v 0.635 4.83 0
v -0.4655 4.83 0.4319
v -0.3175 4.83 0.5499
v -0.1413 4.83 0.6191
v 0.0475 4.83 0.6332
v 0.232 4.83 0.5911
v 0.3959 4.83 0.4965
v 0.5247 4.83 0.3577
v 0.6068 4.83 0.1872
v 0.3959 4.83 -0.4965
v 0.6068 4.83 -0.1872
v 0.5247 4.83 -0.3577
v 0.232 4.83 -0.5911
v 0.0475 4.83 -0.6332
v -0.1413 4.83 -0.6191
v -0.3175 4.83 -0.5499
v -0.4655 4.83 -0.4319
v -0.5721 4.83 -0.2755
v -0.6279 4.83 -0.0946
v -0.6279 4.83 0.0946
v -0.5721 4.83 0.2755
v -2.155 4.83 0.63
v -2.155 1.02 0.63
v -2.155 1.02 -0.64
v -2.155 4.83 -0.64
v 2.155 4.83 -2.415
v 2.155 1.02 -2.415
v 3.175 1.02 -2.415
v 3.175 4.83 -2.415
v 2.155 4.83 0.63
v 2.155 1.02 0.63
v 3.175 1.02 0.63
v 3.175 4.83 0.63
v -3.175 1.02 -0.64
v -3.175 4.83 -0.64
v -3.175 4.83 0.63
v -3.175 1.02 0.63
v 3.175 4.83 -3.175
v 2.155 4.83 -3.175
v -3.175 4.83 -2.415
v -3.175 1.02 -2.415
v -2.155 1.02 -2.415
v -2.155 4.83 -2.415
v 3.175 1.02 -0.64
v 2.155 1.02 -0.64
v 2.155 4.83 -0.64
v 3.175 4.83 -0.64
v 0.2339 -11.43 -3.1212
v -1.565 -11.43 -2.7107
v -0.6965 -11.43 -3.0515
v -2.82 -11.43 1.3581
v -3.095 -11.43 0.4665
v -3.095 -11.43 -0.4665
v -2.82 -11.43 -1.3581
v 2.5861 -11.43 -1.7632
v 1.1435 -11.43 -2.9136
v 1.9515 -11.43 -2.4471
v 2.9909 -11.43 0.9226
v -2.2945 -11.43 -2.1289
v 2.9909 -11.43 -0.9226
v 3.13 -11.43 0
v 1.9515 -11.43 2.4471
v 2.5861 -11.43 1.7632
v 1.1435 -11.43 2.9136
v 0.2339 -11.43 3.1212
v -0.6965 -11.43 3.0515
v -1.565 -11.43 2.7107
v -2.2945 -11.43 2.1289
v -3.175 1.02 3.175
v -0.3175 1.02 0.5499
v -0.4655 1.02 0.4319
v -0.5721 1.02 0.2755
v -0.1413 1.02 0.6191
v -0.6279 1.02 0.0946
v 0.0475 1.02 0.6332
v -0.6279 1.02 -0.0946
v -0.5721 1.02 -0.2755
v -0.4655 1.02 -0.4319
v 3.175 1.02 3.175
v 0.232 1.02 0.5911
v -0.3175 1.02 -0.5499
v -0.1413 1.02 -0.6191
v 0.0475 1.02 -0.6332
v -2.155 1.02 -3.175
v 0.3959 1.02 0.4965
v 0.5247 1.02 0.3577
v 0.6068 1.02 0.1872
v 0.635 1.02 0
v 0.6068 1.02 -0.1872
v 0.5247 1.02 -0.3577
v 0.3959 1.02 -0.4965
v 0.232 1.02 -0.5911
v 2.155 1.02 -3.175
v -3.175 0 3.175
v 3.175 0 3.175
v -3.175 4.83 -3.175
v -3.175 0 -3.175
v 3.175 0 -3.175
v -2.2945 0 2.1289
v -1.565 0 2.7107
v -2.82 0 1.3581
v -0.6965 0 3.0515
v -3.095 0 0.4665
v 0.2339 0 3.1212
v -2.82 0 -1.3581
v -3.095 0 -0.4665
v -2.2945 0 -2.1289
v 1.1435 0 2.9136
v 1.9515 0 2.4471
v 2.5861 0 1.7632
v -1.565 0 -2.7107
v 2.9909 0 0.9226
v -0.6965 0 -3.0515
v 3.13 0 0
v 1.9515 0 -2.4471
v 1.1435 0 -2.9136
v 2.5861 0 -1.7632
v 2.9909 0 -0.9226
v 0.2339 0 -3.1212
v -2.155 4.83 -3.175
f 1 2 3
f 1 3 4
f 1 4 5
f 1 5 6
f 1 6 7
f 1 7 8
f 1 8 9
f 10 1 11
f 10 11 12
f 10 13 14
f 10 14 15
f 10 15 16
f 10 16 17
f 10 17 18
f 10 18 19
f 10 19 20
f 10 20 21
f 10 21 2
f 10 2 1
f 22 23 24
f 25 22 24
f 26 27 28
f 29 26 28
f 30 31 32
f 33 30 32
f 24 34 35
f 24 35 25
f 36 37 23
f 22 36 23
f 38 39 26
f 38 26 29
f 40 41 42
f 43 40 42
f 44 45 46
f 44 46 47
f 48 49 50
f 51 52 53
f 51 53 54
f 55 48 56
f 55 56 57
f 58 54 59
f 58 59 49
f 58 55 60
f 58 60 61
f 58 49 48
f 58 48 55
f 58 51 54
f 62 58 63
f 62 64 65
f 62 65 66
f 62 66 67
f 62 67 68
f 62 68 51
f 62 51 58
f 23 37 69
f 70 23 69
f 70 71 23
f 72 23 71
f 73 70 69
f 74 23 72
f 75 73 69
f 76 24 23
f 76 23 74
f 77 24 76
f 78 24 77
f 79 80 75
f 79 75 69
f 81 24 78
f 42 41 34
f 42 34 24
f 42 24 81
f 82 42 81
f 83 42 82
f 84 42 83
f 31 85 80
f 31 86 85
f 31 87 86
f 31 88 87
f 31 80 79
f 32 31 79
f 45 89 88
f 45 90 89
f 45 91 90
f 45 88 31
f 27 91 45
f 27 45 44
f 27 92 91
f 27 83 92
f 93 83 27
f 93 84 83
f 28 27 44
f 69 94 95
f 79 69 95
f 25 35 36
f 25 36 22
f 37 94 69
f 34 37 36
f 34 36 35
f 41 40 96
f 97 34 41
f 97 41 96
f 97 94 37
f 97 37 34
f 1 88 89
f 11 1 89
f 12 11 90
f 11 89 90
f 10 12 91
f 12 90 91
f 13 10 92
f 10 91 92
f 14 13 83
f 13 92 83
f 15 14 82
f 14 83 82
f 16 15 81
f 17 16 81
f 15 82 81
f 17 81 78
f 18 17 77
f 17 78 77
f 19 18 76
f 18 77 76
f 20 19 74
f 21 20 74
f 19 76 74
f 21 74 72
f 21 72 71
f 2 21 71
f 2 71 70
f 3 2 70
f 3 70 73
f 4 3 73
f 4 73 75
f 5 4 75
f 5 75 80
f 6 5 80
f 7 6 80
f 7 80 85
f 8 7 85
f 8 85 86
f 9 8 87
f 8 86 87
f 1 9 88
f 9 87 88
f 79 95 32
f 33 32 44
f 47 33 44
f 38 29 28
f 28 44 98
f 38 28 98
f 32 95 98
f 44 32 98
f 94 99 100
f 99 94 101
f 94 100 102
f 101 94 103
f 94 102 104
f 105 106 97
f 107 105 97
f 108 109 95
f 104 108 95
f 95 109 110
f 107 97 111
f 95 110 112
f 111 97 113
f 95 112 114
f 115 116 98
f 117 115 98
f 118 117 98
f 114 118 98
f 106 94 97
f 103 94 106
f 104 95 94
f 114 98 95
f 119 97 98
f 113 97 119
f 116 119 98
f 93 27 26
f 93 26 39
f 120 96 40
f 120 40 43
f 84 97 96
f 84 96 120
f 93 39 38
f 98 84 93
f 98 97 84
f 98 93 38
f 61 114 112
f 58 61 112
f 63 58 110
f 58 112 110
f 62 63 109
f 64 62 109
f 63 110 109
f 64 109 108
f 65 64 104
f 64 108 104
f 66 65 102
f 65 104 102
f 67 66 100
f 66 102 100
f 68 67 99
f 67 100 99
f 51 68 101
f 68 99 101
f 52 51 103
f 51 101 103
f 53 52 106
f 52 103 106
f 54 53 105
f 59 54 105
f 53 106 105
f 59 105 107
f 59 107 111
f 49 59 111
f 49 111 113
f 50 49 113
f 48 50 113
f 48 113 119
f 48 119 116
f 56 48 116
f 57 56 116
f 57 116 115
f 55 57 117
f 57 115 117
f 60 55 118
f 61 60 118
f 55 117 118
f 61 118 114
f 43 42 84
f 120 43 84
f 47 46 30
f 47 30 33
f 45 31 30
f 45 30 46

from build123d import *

# Parameters (mm, degrees)
SKETCH1_W           = 6.35
SKETCH1_H           = 6.35
BOSS_EXTRUDE1_DEPTH = 1.02
SKETCH2_W           = 1.02
SKETCH2_H           = 0.76
SKETCH2_H_2         = 1.27
BOSS_EXTRUDE2_DEPTH = 3.81
SKETCH3_R           = 0.635
BOSS_EXTRUDE3_DEPTH = 3.81
SKETCH4_R           = 3.13
BOSS_EXTRUDE4_DEPTH = 11.43


with BuildPart() as part:
    # Sketch1 → Boss-Extrude1 (new body)
    with BuildSketch(Plane(origin=(0, 0, 0), x_dir=(1, 0, 0), z_dir=(0, 1, 0))):
        Rectangle(SKETCH1_W, SKETCH1_H)
    extrude(amount=BOSS_EXTRUDE1_DEPTH)

    # Sketch2 → Boss-Extrude2 (add)
    with BuildSketch(Plane(origin=(0, 1.02, 0), x_dir=(1, 0, 0), z_dir=(0, 1, 0))):
        with Locations((-2.665, 2.795)):
            Rectangle(SKETCH2_W, SKETCH2_H)
        with Locations((-2.665, 0.005)):
            Rectangle(SKETCH2_W, SKETCH2_H_2)
        with Locations((2.665, 0.005)):
            Rectangle(SKETCH2_W, SKETCH2_H_2)
        with Locations((2.665, 2.795)):
            Rectangle(SKETCH2_W, SKETCH2_H)
    extrude(amount=BOSS_EXTRUDE2_DEPTH)

    # Sketch3 → Boss-Extrude3 (add)
    with BuildSketch(Plane(origin=(0, 1.02, 0), x_dir=(1, 0, 0), z_dir=(0, 1, 0))):
        Circle(SKETCH3_R)
    extrude(amount=BOSS_EXTRUDE3_DEPTH)

    # Sketch4 → Boss-Extrude4 (add)
    with BuildSketch(Plane.XZ):
        Circle(SKETCH4_R)
    extrude(amount=BOSS_EXTRUDE4_DEPTH)


solid = part.part
